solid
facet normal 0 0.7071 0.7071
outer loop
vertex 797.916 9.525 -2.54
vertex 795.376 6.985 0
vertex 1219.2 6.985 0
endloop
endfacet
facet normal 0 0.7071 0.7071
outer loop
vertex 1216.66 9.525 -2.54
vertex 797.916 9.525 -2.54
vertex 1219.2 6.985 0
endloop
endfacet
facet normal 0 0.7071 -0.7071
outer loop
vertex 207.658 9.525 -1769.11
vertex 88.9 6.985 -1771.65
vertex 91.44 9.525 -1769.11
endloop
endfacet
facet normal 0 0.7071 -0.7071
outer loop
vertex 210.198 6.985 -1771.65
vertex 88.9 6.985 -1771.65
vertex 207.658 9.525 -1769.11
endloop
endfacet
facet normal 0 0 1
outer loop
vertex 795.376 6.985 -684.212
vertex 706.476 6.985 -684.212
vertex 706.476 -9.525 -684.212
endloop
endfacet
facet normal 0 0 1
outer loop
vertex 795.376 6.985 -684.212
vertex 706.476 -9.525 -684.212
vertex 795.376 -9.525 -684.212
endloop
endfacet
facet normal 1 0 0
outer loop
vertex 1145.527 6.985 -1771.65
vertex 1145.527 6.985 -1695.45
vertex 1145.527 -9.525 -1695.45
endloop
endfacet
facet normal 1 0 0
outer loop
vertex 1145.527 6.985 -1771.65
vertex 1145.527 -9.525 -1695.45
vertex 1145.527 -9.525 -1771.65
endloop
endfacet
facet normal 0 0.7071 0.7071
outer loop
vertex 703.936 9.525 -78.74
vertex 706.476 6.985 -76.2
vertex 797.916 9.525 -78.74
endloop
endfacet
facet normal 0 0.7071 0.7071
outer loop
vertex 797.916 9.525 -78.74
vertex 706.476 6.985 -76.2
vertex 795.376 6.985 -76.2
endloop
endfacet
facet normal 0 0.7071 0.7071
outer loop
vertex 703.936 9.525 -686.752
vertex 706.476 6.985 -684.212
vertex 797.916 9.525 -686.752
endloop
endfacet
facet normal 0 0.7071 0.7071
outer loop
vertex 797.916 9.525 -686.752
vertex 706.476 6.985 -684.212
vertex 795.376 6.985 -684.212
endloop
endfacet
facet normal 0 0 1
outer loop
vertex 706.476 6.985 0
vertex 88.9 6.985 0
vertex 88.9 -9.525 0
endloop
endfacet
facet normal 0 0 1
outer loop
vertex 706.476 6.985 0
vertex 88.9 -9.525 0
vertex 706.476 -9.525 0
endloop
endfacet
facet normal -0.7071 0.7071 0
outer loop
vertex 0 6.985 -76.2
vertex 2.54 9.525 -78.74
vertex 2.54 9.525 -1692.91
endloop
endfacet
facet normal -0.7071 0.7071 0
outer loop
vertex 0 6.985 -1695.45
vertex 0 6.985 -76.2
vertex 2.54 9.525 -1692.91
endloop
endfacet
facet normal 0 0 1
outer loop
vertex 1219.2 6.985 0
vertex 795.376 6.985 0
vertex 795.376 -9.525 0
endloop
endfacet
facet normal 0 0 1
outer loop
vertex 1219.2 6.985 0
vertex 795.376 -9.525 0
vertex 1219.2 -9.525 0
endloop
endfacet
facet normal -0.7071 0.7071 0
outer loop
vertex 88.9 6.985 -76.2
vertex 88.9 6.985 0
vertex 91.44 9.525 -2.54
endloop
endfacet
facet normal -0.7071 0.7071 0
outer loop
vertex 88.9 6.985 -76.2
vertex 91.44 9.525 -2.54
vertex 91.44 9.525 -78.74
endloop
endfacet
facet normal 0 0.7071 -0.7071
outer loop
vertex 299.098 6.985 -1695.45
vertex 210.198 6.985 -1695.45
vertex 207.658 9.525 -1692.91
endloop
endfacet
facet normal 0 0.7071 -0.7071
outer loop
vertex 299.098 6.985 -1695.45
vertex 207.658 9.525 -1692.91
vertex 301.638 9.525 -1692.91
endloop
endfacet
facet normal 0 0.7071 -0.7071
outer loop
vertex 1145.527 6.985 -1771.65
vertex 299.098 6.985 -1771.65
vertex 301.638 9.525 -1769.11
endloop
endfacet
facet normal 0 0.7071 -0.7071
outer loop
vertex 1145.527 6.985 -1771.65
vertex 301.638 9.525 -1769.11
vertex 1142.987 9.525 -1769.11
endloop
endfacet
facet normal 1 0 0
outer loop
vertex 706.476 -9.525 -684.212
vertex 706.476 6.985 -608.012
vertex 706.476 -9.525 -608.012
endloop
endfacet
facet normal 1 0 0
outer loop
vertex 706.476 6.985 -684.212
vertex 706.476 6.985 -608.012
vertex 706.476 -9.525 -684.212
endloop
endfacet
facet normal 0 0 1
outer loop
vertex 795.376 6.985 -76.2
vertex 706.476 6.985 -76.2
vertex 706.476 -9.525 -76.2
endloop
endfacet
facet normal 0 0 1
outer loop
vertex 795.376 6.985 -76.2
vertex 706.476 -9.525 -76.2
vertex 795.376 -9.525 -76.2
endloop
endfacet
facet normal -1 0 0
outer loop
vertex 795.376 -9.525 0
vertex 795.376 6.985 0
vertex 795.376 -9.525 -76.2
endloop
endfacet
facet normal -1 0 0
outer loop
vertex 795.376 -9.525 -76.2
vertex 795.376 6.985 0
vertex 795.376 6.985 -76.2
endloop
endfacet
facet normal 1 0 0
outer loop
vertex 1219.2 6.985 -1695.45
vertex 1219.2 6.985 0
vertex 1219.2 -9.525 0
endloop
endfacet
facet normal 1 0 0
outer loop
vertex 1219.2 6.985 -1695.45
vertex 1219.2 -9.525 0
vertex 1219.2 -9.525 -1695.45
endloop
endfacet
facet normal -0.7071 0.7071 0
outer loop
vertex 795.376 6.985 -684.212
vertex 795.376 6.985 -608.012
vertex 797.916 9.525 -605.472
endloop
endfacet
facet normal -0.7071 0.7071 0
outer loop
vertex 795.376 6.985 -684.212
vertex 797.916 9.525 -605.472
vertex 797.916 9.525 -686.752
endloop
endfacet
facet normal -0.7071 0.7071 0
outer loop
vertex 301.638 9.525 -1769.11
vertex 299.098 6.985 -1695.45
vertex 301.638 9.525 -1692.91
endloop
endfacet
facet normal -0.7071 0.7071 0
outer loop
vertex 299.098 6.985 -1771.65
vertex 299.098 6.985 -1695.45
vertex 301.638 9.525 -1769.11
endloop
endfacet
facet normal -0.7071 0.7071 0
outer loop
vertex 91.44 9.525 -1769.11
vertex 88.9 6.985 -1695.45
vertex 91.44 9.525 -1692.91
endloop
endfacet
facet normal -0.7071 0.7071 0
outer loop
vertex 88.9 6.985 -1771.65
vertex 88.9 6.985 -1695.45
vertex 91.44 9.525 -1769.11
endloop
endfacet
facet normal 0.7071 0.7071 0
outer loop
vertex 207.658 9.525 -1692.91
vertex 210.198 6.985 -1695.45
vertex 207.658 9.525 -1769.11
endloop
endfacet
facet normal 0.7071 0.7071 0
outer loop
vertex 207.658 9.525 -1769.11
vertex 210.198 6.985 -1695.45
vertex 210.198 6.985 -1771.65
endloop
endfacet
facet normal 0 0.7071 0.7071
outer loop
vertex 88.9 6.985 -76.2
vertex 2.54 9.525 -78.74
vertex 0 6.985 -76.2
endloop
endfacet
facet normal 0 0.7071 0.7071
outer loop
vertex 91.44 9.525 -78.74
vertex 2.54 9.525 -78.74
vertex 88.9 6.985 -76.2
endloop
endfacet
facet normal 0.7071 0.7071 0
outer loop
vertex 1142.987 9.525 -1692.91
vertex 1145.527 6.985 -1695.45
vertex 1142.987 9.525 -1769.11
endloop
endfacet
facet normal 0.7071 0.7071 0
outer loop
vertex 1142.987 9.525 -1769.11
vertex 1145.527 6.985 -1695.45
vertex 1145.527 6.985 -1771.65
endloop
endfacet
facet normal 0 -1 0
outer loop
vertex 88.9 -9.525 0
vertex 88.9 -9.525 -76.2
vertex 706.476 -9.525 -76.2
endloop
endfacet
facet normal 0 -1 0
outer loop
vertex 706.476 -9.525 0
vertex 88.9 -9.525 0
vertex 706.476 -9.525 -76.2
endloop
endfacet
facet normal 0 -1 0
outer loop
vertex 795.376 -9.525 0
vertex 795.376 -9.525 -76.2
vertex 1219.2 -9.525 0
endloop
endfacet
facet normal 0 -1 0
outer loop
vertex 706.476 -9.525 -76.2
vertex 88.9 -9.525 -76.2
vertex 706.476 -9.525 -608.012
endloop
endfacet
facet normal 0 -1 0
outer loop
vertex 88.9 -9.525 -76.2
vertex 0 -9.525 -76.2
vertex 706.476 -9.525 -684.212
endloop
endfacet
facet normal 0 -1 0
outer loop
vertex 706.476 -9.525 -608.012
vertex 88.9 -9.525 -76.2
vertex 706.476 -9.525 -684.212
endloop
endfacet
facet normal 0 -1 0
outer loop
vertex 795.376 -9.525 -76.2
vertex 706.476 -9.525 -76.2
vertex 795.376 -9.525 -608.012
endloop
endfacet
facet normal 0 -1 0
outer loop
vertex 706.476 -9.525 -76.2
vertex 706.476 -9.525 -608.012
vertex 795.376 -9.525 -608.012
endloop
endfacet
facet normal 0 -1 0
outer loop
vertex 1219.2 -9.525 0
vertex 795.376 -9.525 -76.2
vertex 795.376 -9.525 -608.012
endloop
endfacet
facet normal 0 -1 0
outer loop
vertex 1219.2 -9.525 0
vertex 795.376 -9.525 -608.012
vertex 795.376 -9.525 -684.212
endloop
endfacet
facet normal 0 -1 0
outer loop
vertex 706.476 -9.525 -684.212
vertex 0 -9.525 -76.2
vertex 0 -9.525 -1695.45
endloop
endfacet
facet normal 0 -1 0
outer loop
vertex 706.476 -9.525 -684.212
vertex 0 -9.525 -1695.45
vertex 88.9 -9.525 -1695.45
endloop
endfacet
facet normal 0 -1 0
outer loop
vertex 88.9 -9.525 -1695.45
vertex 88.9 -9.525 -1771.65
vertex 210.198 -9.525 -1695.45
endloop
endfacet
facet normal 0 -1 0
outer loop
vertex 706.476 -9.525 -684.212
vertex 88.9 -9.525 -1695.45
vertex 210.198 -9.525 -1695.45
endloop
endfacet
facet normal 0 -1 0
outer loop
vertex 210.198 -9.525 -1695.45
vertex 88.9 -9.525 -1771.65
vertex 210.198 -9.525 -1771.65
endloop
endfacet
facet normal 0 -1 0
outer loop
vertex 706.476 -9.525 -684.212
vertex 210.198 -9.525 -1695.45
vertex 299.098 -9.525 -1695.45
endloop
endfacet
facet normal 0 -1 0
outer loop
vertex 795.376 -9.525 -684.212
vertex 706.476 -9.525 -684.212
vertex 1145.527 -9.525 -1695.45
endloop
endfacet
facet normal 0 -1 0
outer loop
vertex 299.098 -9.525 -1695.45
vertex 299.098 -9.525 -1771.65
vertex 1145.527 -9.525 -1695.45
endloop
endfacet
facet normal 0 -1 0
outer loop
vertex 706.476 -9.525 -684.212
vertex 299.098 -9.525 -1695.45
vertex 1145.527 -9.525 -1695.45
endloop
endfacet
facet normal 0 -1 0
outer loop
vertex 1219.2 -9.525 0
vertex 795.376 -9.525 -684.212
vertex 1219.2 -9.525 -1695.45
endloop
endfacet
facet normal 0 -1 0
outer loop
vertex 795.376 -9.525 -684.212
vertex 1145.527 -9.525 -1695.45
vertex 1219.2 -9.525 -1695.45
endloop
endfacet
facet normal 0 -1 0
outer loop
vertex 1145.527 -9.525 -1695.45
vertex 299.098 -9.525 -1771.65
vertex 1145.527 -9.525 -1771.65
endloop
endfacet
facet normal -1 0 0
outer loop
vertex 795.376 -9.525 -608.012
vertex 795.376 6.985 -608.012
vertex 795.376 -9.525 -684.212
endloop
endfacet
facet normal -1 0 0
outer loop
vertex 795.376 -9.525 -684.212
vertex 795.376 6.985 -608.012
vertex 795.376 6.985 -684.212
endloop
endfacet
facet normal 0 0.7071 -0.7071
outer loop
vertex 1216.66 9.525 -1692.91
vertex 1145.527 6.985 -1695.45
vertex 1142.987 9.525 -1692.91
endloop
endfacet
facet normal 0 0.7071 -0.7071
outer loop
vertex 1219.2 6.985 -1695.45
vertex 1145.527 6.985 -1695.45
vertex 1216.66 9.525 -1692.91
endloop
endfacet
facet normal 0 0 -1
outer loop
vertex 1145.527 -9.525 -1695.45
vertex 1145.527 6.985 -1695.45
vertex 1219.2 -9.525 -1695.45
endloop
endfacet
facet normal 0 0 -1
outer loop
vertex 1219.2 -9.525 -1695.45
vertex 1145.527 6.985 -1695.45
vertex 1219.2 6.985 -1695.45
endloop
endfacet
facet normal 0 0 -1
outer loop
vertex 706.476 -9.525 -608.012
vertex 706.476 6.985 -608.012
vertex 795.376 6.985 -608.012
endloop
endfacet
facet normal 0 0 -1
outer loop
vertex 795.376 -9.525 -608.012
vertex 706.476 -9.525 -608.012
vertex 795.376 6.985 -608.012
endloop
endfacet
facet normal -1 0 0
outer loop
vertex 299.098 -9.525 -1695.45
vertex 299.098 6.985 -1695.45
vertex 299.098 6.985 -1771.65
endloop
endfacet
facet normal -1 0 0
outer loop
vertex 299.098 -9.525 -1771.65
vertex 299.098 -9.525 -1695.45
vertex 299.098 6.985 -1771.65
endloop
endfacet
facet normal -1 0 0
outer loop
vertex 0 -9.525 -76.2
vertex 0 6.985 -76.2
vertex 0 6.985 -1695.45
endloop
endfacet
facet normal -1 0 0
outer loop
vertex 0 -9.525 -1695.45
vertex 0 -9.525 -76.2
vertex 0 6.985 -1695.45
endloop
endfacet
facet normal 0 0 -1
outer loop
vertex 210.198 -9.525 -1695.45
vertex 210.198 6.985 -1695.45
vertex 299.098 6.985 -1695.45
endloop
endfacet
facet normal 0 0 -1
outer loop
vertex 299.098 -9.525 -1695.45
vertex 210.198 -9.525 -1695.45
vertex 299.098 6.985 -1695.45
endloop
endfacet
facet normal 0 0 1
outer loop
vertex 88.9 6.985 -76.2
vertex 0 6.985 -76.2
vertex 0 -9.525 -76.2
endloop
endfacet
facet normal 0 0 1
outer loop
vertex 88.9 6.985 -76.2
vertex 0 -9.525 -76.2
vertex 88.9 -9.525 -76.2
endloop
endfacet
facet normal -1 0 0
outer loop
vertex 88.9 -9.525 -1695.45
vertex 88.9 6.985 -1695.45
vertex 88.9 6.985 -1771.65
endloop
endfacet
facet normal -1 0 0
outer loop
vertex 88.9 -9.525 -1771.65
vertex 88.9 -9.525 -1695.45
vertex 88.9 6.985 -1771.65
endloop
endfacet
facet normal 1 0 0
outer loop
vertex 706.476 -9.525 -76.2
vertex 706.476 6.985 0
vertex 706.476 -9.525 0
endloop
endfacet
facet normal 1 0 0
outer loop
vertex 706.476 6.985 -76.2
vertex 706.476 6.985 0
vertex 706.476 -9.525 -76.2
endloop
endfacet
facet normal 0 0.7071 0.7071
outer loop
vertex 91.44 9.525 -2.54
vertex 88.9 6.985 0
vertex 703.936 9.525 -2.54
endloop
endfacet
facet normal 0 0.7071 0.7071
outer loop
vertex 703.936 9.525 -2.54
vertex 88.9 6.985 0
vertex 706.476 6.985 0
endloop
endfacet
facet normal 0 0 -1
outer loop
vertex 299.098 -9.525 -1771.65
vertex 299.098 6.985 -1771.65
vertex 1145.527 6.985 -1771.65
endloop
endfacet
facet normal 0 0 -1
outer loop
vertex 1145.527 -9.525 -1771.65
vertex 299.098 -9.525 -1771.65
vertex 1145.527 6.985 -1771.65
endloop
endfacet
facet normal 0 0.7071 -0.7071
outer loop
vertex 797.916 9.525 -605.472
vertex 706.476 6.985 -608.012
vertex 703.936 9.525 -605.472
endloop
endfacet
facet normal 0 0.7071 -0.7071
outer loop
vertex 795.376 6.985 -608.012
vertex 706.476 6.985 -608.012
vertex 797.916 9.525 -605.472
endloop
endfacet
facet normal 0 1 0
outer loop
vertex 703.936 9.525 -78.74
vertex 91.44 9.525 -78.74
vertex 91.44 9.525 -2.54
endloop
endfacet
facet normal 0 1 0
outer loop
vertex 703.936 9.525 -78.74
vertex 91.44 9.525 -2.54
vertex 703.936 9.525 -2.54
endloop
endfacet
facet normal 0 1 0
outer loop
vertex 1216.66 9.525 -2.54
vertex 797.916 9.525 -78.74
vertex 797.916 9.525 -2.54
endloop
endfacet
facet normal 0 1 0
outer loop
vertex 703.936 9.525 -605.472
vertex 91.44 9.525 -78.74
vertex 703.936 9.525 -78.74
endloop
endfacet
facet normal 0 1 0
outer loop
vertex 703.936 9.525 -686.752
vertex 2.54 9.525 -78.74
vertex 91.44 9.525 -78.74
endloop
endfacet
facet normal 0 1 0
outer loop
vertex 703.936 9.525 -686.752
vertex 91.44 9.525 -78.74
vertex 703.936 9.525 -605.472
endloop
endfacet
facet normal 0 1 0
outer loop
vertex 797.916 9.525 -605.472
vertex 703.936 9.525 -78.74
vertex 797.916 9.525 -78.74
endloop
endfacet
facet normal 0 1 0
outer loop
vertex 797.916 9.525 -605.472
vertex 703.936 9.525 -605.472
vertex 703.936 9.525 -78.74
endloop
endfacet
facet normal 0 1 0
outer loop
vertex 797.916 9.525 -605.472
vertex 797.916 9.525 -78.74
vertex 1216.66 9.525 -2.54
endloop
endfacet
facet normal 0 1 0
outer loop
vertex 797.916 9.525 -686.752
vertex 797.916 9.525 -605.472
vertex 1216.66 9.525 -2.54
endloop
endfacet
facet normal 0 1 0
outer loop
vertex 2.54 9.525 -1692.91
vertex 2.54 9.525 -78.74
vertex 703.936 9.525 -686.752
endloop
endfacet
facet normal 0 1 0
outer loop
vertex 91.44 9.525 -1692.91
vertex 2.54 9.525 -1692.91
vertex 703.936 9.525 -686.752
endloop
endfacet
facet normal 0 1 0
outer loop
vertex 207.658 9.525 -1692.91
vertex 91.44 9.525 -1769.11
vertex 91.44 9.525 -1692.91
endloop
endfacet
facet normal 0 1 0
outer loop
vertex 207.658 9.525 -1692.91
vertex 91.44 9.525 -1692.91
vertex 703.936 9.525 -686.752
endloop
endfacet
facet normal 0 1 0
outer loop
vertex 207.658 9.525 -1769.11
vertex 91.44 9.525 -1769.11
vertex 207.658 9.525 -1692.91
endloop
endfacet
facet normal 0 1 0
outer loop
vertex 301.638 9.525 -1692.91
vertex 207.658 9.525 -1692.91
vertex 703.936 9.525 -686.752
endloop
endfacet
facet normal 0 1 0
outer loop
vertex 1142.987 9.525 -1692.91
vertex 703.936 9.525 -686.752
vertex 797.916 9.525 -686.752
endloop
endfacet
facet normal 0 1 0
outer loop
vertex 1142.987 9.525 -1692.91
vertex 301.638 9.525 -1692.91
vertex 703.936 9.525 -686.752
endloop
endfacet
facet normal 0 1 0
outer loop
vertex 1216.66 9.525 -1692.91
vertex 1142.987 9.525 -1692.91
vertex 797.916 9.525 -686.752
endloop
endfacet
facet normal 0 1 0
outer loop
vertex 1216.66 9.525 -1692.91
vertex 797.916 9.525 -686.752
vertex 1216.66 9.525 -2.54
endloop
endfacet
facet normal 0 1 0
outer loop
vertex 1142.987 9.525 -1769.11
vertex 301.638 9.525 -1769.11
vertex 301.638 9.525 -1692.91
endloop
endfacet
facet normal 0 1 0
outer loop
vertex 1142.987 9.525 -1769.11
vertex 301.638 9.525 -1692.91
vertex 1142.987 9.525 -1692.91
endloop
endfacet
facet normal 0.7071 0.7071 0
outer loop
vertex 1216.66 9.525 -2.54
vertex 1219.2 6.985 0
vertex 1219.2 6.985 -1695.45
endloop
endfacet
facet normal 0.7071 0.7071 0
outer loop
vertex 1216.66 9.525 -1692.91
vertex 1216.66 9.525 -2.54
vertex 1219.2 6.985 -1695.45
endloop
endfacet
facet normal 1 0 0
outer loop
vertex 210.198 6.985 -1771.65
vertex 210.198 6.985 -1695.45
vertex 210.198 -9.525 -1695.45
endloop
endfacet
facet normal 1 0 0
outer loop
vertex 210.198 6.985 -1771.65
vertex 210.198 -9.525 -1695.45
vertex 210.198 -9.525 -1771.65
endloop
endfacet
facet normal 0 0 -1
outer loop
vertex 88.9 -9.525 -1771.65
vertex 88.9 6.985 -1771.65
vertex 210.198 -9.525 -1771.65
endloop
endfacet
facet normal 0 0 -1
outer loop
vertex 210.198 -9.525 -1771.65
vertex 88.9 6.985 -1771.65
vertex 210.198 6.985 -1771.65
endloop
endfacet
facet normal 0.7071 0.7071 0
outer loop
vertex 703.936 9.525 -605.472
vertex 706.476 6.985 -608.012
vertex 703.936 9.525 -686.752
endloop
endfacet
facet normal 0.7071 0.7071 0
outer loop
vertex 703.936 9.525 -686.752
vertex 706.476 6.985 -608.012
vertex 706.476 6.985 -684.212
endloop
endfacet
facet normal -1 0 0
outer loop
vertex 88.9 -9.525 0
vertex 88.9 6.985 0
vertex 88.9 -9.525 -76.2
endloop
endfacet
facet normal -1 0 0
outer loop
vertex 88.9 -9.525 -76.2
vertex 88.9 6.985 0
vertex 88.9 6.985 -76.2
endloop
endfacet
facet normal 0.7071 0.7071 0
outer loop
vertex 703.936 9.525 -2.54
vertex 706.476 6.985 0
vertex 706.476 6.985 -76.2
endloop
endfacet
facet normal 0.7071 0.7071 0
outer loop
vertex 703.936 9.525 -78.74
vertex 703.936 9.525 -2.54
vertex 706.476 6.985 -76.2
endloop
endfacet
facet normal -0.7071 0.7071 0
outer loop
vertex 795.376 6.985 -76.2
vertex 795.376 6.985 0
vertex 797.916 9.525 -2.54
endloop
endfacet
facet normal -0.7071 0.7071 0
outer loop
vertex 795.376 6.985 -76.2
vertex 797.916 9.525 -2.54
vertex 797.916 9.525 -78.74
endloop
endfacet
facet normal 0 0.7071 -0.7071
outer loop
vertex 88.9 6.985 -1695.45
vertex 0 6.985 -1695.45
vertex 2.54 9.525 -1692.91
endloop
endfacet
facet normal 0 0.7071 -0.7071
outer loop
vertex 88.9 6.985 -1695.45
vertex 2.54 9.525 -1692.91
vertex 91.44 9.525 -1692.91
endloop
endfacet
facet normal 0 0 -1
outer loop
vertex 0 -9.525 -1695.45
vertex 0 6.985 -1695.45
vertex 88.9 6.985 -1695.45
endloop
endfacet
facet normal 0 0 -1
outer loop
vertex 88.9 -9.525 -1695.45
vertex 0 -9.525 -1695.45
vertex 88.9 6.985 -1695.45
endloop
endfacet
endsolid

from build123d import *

# Parameters (mm, degrees)
SKETCH1_W           = 1219.2
SKETCH1_H           = 1771.65
BOSS_EXTRUDE1_DEPTH = 9.525
SKETCH3_W           = 88.9
SKETCH3_H           = 76.2
SKETCH3_W_2         = 73.6727
CUT_EXTRUDE2_DEPTH  = 20.05
CHAMFER1_SIZE       = 2.54


with BuildPart() as part:
    # Sketch1 → Boss-Extrude1 (new body, symmetric)
    with BuildSketch(Plane(origin=(0, 0, 0), x_dir=(1, 0, 0), z_dir=(0, 1, 0))):
        with Locations((609.6, 885.825)):
            Rectangle(SKETCH1_W, SKETCH1_H)
    extrude(amount=BOSS_EXTRUDE1_DEPTH, both=True)

    # Sketch3 → Cut-Extrude2 (cut, through all)
    with BuildSketch(Plane(origin=(0, 9.525, 0), x_dir=(1, 0, 0), z_dir=(0, 1, 0))):
        with Locations((44.45, 1733.55)):
            Rectangle(SKETCH3_W, SKETCH3_H)
        with Locations((254.6477, 1733.55)):
            Rectangle(SKETCH3_W, SKETCH3_H)
        with Locations((750.9256, 646.112499999)):
            Rectangle(SKETCH3_W, SKETCH3_H)
        with Locations((44.45, 38.1)):
            Rectangle(SKETCH3_W, SKETCH3_H)
        with Locations((750.9256, 38.1)):
            Rectangle(SKETCH3_W, SKETCH3_H)
        with Locations((1182.36365, 1733.55)):
            Rectangle(SKETCH3_W_2, SKETCH3_H)
    extrude(amount=-CUT_EXTRUDE2_DEPTH, mode=Mode.SUBTRACT)

    # Chamfer1
    chamfer1_edges = [part.edges().sort_by_distance(p)[0] for p in [
        (1219.2, 9.525, -847.725),
        (0, 9.525, -885.825),
        (397.6878, 9.525, 0),
        (1007.2878, 9.525, 0),
        (722.3125, 9.525, -1771.65),
        (149.54885, 9.525, -1771.65),
        (1145.5273, 9.525, -1733.55),
        (1182.36365, 9.525, -1695.45),
        (795.3756, 9.525, -38.1),
        (750.9256, 9.525, -76.2),
        (706.4756, 9.525, -38.1),
        (88.9, 9.525, -38.1),
        (44.45, 9.525, -76.2),
        (706.4756, 9.525, -646.112499999),
        (750.9256, 9.525, -608.012499999),
        (795.3756, 9.525, -646.112499999),
        (750.9256, 9.525, -684.212499999),
        (210.1977, 9.525, -1733.55),
        (254.6477, 9.525, -1695.45),
        (299.0977, 9.525, -1733.55),
        (44.45, 9.525, -1695.45),
        (88.9, 9.525, -1733.55),
    ]]
    chamfer(chamfer1_edges, length=CHAMFER1_SIZE)


solid = part.part
